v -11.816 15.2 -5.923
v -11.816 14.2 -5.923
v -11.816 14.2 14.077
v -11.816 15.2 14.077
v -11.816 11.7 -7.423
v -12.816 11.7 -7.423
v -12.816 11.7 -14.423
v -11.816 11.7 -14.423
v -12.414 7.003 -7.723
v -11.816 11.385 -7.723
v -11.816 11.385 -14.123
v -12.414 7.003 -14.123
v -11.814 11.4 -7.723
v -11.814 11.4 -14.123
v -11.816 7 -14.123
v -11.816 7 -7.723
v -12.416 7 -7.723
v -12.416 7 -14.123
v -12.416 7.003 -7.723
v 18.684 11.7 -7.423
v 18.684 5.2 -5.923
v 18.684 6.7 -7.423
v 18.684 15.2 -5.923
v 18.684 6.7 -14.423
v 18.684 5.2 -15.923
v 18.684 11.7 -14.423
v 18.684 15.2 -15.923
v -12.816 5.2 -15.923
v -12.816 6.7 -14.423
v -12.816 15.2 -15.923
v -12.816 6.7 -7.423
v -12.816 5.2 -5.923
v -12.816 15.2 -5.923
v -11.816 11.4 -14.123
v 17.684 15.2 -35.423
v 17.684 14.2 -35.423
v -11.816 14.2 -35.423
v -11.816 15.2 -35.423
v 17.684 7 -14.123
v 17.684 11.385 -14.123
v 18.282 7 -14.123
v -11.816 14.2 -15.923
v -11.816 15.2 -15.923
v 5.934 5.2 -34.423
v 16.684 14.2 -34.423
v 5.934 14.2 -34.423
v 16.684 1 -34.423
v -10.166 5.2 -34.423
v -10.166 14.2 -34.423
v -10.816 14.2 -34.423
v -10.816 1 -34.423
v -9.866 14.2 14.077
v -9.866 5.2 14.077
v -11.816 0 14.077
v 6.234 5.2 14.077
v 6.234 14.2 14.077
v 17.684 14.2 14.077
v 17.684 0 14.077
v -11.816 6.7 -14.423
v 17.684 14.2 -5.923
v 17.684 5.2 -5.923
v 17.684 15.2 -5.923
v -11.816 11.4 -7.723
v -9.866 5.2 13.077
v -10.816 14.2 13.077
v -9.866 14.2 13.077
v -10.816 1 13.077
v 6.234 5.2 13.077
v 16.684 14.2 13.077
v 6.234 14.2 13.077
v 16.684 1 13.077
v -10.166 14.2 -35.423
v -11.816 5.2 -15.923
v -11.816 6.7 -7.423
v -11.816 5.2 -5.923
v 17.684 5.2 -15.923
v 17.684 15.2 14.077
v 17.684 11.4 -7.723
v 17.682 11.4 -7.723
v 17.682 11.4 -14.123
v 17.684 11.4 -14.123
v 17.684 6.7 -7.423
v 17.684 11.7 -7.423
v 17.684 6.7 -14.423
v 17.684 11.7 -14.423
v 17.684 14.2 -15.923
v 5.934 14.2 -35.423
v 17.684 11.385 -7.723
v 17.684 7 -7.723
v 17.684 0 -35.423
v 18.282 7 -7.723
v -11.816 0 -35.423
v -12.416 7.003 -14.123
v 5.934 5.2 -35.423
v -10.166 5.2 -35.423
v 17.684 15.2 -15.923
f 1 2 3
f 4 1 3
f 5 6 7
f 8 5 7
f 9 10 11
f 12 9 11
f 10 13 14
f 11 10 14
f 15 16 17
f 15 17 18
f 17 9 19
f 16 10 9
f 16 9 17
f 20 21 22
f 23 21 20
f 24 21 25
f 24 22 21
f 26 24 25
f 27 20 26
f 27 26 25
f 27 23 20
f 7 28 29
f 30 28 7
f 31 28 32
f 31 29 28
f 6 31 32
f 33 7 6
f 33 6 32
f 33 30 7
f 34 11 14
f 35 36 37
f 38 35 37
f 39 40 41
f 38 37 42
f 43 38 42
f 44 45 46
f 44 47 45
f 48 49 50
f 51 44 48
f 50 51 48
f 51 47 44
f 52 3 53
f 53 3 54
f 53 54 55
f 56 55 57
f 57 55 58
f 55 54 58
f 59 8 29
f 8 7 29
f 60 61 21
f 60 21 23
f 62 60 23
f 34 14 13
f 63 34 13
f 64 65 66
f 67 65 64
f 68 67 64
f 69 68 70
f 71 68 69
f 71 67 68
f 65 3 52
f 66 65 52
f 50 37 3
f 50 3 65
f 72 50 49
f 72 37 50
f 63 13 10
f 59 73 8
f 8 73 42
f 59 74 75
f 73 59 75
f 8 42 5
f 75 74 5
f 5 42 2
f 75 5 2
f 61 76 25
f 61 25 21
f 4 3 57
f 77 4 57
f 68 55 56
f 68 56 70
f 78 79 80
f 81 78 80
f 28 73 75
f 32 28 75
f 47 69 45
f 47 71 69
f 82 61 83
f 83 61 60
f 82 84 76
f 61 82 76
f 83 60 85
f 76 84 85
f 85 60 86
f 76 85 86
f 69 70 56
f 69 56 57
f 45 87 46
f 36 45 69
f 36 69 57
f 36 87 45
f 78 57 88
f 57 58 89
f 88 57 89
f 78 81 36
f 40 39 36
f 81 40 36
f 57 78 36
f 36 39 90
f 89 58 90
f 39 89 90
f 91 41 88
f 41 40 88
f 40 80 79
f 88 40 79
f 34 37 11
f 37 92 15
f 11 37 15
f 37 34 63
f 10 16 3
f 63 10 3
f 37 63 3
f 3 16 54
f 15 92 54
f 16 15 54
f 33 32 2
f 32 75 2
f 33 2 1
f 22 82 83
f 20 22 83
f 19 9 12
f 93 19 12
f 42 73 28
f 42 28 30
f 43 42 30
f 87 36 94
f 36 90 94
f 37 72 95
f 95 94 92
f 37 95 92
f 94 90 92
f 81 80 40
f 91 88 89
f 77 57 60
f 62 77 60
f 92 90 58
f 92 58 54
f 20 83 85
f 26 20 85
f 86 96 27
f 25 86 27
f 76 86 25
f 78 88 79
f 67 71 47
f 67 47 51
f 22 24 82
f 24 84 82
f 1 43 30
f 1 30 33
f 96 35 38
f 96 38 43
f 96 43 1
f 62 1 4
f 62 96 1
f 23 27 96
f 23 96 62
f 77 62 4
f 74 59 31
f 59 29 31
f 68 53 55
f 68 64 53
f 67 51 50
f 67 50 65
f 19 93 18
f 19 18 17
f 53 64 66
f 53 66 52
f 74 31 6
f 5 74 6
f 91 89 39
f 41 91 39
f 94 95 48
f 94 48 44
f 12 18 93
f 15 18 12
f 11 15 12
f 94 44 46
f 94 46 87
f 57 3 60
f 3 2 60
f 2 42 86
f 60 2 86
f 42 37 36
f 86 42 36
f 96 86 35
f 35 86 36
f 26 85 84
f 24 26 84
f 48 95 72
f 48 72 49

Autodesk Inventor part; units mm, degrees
ref_plane "YZ Plane" through (0, 0, 0) normal (1, 0, 0) x (0, 1, 0)
sketch "Sketch1" plane through (0, 0, 0) normal (0, 1, 0) x (-1, 0, 0)
  line L0 (11.8161, 14.0771) -> (-17.6839, 14.0771)
  line L1 (-17.6839, 14.0771) -> (-17.6839, -35.4229)
  line L2 (-17.6839, -35.4229) -> (11.8161, -35.4229)
  line L3 (11.8161, -35.4229) -> (11.8161, 14.0771)
  point P0 (0, 0)
  dimension "d0" = 29.5
  dimension "d1" = 49.5
extrude "Extrusion1" add sketch "Sketch1" along normal blind 1
sketch "Sketch2" plane through (0, 1, 0) normal (0, 1, 0) x (1, 0, 0)
  line L0 (-10.8161, -13.0771) -> (16.6839, -13.0771)
  line L1 (16.6839, -13.0771) -> (16.6839, 34.4229)
  line L2 (16.6839, 34.4229) -> (-10.8161, 34.4229)
  line L3 (-10.8161, 34.4229) -> (-10.8161, -13.0771)
  line L4 (-11.8161, 35.4229) -> (-11.8161, -14.0771) projected
  line L5 (17.6839, 35.4229) -> (-11.8161, 35.4229) projected
  line L6 (17.6839, -14.0771) -> (17.6839, 35.4229) projected
  line L7 (-11.8161, -14.0771) -> (17.6839, -14.0771) projected
  point P0 (0, 0)
  dimension "d4" = 1
  dimension "d5" = 1
  dimension "d6" = 1
  dimension "d7" = 1
extrude "Extrusion2" add sketch "Sketch2" along normal blind 4.2
sketch "Sketch3" plane through (0, 5.2, 0) normal (0, 1, 0) x (1, 0, 0)
  line L0 (-11.8161, -14.0771) -> (17.6839, -14.0771) projected
  line L1 (-10.8161, -13.0771) -> (16.6839, -13.0771) projected
  line L2 (-9.8661, -14.0771) -> (6.2339, -14.0771)
  line L3 (6.2339, -14.0771) -> (6.2339, -13.0771)
  line L4 (6.2339, -13.0771) -> (-9.8661, -13.0771)
  line L5 (-9.8661, -13.0771) -> (-9.8661, -14.0771)
  line L6 (16.6839, 34.4229) -> (-10.8161, 34.4229) projected
  line L7 (17.6839, 35.4229) -> (-11.8161, 35.4229) projected
  line L8 (-10.1661, 34.4229) -> (5.9339, 34.4229)
  line L9 (5.9339, 34.4229) -> (5.9339, 35.4229)
  line L10 (5.9339, 35.4229) -> (-10.1661, 35.4229)
  line L11 (-10.1661, 35.4229) -> (-10.1661, 34.4229)
  line L12 (-11.8161, -14.0771) -> (17.6839, -14.0771)
  line L13 (17.6839, -14.0771) -> (17.6839, 35.4229)
  line L14 (17.6839, 35.4229) -> (-11.8161, 35.4229)
  line L15 (-11.8161, 35.4229) -> (-11.8161, -14.0771)
  line L16 (-10.8161, -13.0771) -> (16.6839, -13.0771)
  line L17 (16.6839, -13.0771) -> (16.6839, 34.4229)
  line L18 (16.6839, 34.4229) -> (-10.8161, 34.4229)
  line L19 (-10.8161, 34.4229) -> (-10.8161, -13.0771)
  point P0 (0, 0)
  dimension "d10" = 0.95
  dimension "d11" = 16.1
  dimension "d12" = 0.65
  dimension "d13" = 16.1
extrude "Extrusion3" add sketch "Sketch3" along normal blind 9 contours L15 L7 L11 L6 L19 L1 L5 L0 | L3 L1 L17 L6 L9 L7 L13 L0
sketch "Sketch4" plane through (0, 14.2, 0) normal (0, 1, 0) x (1, 0, 0)
  line L0 (-11.8161, 35.4229) -> (-11.8161, -14.0771) projected
  line L1 (-11.8161, -14.0771) -> (17.6839, -14.0771)
  line L2 (17.6839, -14.0771) -> (17.6839, 35.4229)
  line L3 (17.6839, 35.4229) -> (-11.8161, 35.4229)
  line L4 (-11.8161, 35.4229) -> (-11.8161, -14.0771)
  point P0 (0, 0)
extrude "Extrusion4" add sketch "Sketch4" along normal blind 1 separate body
sketch "Sketch5" plane through (17.6839, 14.2, 14.0771) normal (1, 0, 0) x (0, 0, -1)
  line L0 (0, 1) -> (49.5, 1) projected
  line L1 (48.5, 0) -> (1, 0) projected
  line L2 (20, 1) -> (30, 1)
  line L3 (30, 1) -> (30, 0)
  line L4 (30, 0) -> (20, 0)
  line L5 (20, 0) -> (20, 1)
  line L6 (20, 0) -> (30, 0)
  line L7 (30, 0) -> (30, -9)
  line L8 (30, -9) -> (20, -9)
  line L9 (20, -9) -> (20, 0)
  point P0 (14.0771, -14.2)
  dimension "d18" = 10
  dimension "d19" = 20
  dimension "d20" = 9
extrude "Extrusion5" add sketch "Sketch5" along normal blind 1 bodies 2
sketch "Sketch6" plane through (-11.8161, 14.2, -35.4229) normal (-1, 0, 0) x (0, 0, 1)
  line L0 (0, 1) -> (49.5, 1) projected
  line L1 (19.5, -9) -> (19.5, 1) projected
  line L2 (29.5, 1) -> (19.5, 1)
  line L3 (19.5, 1) -> (19.5, -9)
  line L4 (19.5, -9) -> (29.5, -9)
  line L5 (29.5, -9) -> (29.5, 1)
  line L6 (49.5, 0) -> (49.5, 1) projected
  point P0 (35.4229, -14.2)
  dimension "d23" = 20
extrude "Extrusion6" add sketch "Sketch6" along normal blind 1 bodies 2
sketch "Sketch7" plane through (-12.8161, 14.2, -35.4229) normal (-1, 0, 0) x (0, 0, 1)
  line L0 (21, -7.5) -> (28, -7.5)
  line L1 (28, -7.5) -> (28, -2.5)
  line L2 (28, -2.5) -> (21, -2.5)
  line L3 (21, -2.5) -> (21, -7.5)
  line L4 (19.5, -9) -> (29.5, -9) projected
  line L5 (29.5, -9) -> (29.5, 1) projected
  line L6 (19.5, 1) -> (19.5, -9) projected
  point P0 (35.4229, -14.2)
  dimension "d26" = 1.5
  dimension "d27" = 1.5
  dimension "d28" = 1.5
  dimension "d29" = 5
extrude "Extrusion7" cut sketch "Sketch7" against normal blind 100 bodies 2
sketch "Sketch8" plane through (-11.8161, 0, -35.4229) normal (-1, 0, 0) x (0, 0, 1)
  line L0 (21.3, 11.4) -> (27.7, 11.4)
  line L1 (27.7, 11.4) -> (27.7, 7)
  line L2 (27.7, 7) -> (21.3, 7)
  line L3 (21.3, 7) -> (21.3, 11.4)
  line L4 (28, 11.7) -> (28, 6.7) projected
  line L5 (21, 6.7) -> (21, 11.7) projected
  line L6 (28, 6.7) -> (21, 6.7) projected
  line L7 (21, 11.7) -> (28, 11.7) projected
  point P0 (35.4229, 0)
  dimension "d32" = 0.3
  dimension "d33" = 0.3
  dimension "d34" = 0.3
  dimension "d35" = 0.3
extrude "Extrusion8" add sketch "Sketch8" along normal blind 0.6 contours L0 L1 L2 L3 bodies 1
ref_plane "Work Plane1" through (-12.4161, 7, -7.7229) normal (0.9908, -0.1351, 0) x (0, 0, -1)
sketch "Sketch9" plane through (-12.4161, 7, -7.7229) normal (0.9908, -0.1351, 0) x (0, 0, -1)
  line L0 (6.4, 4.4407) -> (0, 4.4407) projected
  line L1 (6.4, 4.4407) -> (0, 4.4407)
  line L2 (0, 4.4407) -> (0, 0.003)
  line L3 (0, 0.003) -> (6.4, 0.003)
  line L4 (6.4, 0.003) -> (6.4, 4.4407)
  point P0 (-7.7229, -5.2582)
extrude "Extrusion9" cut sketch "Sketch9" against normal blind 0.6 bodies 1
sketch "Sketch10" plane through (17.6839, 0, 14.0771) normal (1, 0, 0) x (0, 0, -1)
  line L0 (21.8, 11.4) -> (21.8, 7) projected
  line L1 (21.8, 7) -> (28.2, 7) projected
  line L2 (21.8, 11.4) -> (28.2, 11.4)
  line L3 (28.2, 11.4) -> (28.2, 7)
  line L4 (28.2, 7) -> (21.8, 7)
  line L5 (21.8, 7) -> (21.8, 11.4)
  point P0 (14.0771, 0)
extrude "Extrusion10" add sketch "Sketch10" along normal blind 0.6 bodies 1
ref_plane "Work Plane2" through (18.2839, 7, -14.1229) normal (-0.9908, -0.1351, 0) x (0, 0, 1)
sketch "Sketch11" plane through (18.2839, 7, -14.1229) normal (-0.9908, -0.1351, 0) x (0, 0, 1)
  line L0 (6.4, 0.0811) -> (6.4, 4.4407) projected
  line L1 (6.4, 4.4407) -> (0, 4.4407)
  line L2 (0, 4.4407) -> (0, 0)
  line L3 (0, 0) -> (6.4, 0)
  line L4 (6.4, 0) -> (6.4, 4.4407)
  point P0 (14.1229, -4.4654)
extrude "Extrusion11" cut sketch "Sketch11" against normal blind 0.6 bodies 1
properties part number "TTL-RS232transreceiverCover"
